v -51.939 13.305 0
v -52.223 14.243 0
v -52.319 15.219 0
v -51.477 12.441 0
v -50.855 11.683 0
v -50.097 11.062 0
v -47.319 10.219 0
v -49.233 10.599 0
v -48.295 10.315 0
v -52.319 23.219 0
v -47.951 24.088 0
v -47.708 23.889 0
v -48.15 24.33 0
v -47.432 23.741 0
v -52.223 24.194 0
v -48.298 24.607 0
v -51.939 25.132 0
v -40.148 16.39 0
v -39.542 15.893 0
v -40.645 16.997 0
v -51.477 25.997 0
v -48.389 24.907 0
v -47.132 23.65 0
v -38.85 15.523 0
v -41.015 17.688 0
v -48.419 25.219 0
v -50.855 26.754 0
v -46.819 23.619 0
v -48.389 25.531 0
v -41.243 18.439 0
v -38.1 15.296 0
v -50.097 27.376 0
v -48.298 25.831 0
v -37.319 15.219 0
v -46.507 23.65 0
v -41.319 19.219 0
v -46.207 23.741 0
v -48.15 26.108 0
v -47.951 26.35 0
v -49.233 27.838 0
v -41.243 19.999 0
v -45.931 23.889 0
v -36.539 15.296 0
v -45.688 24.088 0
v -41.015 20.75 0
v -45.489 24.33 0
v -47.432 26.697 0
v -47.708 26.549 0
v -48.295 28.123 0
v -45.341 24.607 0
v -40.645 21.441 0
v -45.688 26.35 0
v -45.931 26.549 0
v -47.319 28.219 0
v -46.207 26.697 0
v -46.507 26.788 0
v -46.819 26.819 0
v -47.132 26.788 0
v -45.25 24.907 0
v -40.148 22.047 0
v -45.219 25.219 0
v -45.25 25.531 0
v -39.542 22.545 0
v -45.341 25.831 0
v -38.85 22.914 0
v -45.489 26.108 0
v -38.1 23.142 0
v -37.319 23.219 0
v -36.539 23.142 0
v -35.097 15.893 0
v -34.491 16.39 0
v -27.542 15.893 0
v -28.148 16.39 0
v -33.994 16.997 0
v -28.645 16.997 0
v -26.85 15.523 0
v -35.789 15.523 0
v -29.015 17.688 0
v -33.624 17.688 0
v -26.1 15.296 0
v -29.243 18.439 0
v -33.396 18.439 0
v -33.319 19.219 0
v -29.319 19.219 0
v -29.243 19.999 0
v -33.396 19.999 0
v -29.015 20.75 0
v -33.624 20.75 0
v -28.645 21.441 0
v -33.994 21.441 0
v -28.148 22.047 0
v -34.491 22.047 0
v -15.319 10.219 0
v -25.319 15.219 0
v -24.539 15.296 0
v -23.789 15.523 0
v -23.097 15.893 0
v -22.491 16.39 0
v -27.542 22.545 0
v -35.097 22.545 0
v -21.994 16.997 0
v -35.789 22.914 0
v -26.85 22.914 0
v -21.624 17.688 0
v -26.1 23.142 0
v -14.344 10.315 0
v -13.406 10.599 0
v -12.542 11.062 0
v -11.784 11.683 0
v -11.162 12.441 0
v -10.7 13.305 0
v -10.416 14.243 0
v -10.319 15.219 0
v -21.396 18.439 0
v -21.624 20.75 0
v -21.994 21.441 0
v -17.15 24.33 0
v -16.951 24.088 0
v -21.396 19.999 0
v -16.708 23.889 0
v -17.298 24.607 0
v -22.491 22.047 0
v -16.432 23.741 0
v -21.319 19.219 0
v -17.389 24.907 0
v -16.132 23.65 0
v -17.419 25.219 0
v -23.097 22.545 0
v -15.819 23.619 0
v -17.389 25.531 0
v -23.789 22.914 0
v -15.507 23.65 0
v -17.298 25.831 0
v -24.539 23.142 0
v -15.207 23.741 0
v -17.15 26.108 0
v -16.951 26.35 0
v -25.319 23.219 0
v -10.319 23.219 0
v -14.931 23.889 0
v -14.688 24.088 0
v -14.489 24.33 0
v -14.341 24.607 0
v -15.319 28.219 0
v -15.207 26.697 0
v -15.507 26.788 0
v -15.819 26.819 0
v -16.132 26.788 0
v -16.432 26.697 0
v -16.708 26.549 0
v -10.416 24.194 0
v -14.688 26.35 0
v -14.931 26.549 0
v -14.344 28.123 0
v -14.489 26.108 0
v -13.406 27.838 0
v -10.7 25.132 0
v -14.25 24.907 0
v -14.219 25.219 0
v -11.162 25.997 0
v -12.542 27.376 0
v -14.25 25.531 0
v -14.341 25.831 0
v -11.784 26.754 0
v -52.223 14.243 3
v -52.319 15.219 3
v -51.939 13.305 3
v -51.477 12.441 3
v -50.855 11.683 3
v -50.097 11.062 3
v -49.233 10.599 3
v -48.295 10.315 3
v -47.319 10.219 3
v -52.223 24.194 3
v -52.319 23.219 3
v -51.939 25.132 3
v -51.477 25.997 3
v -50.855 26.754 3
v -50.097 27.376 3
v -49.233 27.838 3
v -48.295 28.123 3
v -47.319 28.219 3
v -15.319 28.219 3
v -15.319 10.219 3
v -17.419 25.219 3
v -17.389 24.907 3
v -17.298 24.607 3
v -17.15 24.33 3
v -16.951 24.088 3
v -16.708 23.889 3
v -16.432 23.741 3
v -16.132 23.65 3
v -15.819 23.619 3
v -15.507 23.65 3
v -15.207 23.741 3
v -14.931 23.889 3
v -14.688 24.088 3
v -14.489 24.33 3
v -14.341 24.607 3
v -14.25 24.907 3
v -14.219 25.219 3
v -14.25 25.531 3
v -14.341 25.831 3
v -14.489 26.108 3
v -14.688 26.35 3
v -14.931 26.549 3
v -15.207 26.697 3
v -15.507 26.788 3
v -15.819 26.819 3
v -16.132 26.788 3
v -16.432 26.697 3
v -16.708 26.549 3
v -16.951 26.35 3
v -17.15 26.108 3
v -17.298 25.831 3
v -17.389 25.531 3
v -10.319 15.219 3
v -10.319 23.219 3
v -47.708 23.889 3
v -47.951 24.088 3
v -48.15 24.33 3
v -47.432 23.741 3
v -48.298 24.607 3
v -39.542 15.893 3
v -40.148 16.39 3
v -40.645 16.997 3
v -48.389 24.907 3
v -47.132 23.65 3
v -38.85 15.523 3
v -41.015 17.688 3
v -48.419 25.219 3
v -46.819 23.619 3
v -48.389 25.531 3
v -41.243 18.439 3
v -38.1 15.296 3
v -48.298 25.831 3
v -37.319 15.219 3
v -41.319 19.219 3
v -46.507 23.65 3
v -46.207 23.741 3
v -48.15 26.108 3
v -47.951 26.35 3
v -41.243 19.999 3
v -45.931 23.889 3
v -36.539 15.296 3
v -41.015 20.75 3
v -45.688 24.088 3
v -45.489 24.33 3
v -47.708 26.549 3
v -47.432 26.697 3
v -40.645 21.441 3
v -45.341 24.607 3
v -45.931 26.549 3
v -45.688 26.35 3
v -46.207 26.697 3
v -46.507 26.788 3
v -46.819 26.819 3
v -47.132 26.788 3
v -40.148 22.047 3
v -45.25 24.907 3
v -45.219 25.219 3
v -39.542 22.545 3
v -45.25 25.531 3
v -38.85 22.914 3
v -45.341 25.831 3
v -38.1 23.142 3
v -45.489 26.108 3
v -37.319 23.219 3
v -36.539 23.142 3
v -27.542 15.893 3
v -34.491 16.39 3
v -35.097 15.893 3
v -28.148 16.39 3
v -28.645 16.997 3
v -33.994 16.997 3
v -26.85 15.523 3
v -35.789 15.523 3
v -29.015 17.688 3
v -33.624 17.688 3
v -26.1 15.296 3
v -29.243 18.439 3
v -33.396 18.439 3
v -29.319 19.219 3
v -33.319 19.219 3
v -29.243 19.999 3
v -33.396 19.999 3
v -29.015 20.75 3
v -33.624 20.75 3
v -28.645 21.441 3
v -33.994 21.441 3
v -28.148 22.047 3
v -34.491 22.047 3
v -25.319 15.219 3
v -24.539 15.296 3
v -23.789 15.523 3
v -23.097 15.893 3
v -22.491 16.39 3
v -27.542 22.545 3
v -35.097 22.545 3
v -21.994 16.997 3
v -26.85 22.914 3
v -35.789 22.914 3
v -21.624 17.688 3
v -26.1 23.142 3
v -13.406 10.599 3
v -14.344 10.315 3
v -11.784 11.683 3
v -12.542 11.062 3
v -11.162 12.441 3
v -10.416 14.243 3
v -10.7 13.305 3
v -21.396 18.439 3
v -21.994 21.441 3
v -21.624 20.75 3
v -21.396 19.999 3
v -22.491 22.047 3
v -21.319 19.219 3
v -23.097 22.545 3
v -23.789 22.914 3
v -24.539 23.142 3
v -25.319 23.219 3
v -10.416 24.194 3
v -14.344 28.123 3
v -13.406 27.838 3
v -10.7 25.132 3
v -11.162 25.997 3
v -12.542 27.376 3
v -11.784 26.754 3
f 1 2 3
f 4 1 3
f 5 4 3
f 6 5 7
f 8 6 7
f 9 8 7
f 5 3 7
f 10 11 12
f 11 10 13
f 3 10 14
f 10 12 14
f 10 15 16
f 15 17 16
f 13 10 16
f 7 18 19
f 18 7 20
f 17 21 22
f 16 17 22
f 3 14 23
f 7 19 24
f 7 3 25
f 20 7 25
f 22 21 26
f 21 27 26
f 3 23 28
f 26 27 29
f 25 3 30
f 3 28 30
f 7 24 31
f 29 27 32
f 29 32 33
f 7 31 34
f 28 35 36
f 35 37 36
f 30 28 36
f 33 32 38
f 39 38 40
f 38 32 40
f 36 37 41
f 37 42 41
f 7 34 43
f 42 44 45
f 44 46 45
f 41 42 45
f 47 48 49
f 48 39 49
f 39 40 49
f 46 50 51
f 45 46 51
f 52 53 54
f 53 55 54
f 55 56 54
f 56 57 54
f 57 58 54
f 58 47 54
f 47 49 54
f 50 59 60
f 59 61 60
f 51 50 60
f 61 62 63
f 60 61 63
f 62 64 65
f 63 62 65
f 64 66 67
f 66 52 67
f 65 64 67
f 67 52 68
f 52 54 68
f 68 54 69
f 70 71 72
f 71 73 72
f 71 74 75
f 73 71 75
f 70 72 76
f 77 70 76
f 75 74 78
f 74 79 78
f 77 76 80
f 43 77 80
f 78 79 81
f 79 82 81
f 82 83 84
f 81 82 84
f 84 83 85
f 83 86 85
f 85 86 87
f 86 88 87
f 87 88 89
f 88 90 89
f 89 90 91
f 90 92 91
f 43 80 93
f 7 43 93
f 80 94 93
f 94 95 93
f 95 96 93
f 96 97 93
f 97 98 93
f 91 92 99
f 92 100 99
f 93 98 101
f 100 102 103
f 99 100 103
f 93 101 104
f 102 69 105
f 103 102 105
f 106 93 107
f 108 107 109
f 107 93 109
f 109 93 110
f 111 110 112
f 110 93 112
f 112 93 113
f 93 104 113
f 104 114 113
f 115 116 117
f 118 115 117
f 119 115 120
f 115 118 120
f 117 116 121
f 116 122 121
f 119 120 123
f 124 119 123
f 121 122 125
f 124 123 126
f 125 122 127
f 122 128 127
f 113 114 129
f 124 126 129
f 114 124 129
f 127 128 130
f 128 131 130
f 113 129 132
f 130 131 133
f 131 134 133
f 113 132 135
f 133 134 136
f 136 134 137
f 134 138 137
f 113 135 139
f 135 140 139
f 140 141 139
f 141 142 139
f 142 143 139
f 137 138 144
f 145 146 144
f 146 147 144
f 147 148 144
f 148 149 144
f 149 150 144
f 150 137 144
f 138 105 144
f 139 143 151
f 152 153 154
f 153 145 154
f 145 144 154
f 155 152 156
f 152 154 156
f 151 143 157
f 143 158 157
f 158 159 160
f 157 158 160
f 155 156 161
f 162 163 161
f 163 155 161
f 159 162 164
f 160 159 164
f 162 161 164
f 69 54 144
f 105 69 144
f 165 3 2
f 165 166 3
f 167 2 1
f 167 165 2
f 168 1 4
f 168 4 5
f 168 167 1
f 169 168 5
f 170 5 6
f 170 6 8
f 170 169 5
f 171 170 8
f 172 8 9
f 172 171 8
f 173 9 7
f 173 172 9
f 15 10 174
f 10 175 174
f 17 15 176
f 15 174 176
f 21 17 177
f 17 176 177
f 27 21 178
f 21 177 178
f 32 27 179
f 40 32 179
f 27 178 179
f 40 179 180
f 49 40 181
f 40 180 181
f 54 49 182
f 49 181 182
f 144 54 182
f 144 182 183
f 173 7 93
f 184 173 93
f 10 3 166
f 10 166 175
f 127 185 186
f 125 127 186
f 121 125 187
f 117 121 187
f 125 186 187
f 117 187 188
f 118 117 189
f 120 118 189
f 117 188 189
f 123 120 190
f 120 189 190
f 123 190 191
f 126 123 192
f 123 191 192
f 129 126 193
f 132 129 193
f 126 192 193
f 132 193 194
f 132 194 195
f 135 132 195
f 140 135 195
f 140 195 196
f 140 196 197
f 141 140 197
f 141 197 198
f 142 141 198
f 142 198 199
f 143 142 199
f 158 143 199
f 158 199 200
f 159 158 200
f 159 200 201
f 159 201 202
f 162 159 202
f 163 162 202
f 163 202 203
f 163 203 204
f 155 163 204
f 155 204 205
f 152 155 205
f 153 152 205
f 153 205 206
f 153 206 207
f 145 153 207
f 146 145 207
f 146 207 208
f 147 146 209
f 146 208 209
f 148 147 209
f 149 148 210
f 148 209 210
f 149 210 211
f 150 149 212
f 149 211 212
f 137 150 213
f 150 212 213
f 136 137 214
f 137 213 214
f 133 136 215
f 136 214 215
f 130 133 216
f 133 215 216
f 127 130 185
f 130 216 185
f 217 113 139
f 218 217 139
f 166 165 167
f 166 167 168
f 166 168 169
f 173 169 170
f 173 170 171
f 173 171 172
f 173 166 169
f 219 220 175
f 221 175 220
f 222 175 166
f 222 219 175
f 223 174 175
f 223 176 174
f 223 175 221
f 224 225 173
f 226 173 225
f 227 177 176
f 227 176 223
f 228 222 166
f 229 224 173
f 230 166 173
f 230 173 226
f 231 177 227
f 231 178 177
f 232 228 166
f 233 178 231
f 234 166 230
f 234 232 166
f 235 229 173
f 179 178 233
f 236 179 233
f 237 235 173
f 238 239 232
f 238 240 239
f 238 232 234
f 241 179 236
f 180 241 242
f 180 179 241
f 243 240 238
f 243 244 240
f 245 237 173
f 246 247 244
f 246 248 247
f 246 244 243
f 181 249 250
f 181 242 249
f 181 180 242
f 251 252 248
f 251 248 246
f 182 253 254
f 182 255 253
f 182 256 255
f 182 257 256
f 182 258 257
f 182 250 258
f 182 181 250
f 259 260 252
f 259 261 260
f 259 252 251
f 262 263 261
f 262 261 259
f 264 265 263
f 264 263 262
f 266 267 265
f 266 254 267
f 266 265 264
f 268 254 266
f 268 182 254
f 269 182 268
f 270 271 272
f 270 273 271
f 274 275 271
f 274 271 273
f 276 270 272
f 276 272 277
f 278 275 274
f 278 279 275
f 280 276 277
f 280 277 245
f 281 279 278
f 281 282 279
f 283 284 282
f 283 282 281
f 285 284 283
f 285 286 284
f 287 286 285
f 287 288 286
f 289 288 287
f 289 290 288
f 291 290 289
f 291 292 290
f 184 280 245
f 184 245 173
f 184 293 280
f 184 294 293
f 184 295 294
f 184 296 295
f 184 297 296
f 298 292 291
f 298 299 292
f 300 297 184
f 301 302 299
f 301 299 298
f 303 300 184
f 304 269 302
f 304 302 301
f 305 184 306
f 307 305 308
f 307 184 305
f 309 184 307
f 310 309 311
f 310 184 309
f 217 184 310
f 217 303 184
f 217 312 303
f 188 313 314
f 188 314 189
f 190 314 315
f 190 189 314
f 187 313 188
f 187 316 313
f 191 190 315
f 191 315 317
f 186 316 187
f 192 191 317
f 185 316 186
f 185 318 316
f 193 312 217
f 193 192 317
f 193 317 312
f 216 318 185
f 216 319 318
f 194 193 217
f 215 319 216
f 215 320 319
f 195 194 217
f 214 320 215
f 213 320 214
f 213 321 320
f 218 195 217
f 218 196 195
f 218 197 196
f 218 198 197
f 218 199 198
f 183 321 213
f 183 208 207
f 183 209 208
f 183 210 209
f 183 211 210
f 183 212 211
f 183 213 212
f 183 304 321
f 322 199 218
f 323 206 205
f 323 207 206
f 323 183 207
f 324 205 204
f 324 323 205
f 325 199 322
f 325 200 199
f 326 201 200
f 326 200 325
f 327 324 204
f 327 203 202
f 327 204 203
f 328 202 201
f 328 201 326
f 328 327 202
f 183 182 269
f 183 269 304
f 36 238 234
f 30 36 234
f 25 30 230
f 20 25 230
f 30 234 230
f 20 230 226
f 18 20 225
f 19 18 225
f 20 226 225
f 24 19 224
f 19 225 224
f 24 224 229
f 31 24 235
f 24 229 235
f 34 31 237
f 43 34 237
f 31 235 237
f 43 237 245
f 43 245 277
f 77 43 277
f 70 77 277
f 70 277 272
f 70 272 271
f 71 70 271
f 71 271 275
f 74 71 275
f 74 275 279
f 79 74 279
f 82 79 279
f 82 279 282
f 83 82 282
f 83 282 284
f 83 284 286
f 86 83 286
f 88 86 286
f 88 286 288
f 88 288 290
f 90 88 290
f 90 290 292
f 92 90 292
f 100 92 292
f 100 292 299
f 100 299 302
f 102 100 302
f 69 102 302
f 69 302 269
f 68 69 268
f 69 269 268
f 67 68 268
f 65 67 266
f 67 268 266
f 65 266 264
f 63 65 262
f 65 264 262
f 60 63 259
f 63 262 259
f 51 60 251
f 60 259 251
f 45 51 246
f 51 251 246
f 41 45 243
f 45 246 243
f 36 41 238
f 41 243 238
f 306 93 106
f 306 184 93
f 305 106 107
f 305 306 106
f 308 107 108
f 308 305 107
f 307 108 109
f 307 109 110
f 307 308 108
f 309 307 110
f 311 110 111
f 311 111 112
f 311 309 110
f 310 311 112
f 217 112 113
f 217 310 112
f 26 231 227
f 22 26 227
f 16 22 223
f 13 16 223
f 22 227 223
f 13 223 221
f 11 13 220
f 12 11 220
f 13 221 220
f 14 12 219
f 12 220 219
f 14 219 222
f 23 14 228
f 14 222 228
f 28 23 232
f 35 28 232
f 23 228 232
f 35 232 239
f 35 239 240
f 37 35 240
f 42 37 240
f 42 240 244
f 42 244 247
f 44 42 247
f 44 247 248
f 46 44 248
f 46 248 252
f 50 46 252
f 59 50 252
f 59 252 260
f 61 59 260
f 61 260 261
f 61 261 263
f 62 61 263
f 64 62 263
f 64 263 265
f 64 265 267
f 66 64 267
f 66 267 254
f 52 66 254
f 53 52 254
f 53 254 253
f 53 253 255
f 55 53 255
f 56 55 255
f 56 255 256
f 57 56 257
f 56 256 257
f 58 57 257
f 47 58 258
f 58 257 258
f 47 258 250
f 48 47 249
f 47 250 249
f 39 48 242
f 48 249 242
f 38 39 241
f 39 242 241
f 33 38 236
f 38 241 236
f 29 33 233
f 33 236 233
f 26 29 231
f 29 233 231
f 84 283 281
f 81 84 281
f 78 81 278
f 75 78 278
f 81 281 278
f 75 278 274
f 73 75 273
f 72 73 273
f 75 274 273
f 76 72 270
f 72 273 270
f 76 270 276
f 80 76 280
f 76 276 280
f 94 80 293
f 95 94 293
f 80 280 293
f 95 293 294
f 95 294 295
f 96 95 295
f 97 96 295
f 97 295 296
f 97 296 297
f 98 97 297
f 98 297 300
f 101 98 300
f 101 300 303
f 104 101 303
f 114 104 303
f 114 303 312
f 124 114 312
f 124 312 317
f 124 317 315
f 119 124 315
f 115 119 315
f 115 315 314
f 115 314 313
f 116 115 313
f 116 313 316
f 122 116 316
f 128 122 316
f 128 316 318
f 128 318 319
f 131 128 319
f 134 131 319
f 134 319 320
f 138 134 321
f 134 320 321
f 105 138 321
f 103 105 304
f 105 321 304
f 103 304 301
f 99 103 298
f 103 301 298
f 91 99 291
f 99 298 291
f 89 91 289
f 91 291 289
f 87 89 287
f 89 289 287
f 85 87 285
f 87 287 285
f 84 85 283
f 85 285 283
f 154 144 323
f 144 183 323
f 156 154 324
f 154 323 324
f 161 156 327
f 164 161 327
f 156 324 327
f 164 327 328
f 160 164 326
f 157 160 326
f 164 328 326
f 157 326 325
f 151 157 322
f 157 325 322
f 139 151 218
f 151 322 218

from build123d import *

# Parameters (mm, degrees)
F0_W     = 42
F0_H     = 18
F1_DEPTH = 3
F2_D     = 3.2
F3_D     = 8
F4_R     = 5


with BuildPart() as f1:
    # F0 (on Top) → F1 (new body)
    with BuildSketch(Plane.XY):
        with Locations((-31.3194459304, 19.2188901754)):
            Rectangle(F0_W, F0_H)
    extrude(amount=F1_DEPTH)

    # F2 (through all)
    with Locations(Plane(origin=(0, 0, 0), x_dir=(1, 0, 0), z_dir=(0, 0, -1))):
        with Locations((-46.8194459304, -25.2188901754), (-15.8194459304, -25.2188901754)):
            Hole(F2_D / 2)

    # F3 (through all)
    with Locations(Plane(origin=(0, 0, 0), x_dir=(1, 0, 0), z_dir=(0, 0, -1))):
        with Locations((-25.3194459304, -19.2188901754), (-37.3194459304, -19.2188901754)):
            Hole(F3_D / 2)

    # F4
    f4_edges = [f1.edges().sort_by_distance(p)[0] for p in [
        (-52.319446, 28.21889, 1.5),
        (-52.319446, 10.21889, 1.5),
        (-10.319446, 28.21889, 1.5),
        (-10.319446, 10.21889, 1.5),
    ]]
    fillet(f4_edges, radius=F4_R)


solid = f1.part
